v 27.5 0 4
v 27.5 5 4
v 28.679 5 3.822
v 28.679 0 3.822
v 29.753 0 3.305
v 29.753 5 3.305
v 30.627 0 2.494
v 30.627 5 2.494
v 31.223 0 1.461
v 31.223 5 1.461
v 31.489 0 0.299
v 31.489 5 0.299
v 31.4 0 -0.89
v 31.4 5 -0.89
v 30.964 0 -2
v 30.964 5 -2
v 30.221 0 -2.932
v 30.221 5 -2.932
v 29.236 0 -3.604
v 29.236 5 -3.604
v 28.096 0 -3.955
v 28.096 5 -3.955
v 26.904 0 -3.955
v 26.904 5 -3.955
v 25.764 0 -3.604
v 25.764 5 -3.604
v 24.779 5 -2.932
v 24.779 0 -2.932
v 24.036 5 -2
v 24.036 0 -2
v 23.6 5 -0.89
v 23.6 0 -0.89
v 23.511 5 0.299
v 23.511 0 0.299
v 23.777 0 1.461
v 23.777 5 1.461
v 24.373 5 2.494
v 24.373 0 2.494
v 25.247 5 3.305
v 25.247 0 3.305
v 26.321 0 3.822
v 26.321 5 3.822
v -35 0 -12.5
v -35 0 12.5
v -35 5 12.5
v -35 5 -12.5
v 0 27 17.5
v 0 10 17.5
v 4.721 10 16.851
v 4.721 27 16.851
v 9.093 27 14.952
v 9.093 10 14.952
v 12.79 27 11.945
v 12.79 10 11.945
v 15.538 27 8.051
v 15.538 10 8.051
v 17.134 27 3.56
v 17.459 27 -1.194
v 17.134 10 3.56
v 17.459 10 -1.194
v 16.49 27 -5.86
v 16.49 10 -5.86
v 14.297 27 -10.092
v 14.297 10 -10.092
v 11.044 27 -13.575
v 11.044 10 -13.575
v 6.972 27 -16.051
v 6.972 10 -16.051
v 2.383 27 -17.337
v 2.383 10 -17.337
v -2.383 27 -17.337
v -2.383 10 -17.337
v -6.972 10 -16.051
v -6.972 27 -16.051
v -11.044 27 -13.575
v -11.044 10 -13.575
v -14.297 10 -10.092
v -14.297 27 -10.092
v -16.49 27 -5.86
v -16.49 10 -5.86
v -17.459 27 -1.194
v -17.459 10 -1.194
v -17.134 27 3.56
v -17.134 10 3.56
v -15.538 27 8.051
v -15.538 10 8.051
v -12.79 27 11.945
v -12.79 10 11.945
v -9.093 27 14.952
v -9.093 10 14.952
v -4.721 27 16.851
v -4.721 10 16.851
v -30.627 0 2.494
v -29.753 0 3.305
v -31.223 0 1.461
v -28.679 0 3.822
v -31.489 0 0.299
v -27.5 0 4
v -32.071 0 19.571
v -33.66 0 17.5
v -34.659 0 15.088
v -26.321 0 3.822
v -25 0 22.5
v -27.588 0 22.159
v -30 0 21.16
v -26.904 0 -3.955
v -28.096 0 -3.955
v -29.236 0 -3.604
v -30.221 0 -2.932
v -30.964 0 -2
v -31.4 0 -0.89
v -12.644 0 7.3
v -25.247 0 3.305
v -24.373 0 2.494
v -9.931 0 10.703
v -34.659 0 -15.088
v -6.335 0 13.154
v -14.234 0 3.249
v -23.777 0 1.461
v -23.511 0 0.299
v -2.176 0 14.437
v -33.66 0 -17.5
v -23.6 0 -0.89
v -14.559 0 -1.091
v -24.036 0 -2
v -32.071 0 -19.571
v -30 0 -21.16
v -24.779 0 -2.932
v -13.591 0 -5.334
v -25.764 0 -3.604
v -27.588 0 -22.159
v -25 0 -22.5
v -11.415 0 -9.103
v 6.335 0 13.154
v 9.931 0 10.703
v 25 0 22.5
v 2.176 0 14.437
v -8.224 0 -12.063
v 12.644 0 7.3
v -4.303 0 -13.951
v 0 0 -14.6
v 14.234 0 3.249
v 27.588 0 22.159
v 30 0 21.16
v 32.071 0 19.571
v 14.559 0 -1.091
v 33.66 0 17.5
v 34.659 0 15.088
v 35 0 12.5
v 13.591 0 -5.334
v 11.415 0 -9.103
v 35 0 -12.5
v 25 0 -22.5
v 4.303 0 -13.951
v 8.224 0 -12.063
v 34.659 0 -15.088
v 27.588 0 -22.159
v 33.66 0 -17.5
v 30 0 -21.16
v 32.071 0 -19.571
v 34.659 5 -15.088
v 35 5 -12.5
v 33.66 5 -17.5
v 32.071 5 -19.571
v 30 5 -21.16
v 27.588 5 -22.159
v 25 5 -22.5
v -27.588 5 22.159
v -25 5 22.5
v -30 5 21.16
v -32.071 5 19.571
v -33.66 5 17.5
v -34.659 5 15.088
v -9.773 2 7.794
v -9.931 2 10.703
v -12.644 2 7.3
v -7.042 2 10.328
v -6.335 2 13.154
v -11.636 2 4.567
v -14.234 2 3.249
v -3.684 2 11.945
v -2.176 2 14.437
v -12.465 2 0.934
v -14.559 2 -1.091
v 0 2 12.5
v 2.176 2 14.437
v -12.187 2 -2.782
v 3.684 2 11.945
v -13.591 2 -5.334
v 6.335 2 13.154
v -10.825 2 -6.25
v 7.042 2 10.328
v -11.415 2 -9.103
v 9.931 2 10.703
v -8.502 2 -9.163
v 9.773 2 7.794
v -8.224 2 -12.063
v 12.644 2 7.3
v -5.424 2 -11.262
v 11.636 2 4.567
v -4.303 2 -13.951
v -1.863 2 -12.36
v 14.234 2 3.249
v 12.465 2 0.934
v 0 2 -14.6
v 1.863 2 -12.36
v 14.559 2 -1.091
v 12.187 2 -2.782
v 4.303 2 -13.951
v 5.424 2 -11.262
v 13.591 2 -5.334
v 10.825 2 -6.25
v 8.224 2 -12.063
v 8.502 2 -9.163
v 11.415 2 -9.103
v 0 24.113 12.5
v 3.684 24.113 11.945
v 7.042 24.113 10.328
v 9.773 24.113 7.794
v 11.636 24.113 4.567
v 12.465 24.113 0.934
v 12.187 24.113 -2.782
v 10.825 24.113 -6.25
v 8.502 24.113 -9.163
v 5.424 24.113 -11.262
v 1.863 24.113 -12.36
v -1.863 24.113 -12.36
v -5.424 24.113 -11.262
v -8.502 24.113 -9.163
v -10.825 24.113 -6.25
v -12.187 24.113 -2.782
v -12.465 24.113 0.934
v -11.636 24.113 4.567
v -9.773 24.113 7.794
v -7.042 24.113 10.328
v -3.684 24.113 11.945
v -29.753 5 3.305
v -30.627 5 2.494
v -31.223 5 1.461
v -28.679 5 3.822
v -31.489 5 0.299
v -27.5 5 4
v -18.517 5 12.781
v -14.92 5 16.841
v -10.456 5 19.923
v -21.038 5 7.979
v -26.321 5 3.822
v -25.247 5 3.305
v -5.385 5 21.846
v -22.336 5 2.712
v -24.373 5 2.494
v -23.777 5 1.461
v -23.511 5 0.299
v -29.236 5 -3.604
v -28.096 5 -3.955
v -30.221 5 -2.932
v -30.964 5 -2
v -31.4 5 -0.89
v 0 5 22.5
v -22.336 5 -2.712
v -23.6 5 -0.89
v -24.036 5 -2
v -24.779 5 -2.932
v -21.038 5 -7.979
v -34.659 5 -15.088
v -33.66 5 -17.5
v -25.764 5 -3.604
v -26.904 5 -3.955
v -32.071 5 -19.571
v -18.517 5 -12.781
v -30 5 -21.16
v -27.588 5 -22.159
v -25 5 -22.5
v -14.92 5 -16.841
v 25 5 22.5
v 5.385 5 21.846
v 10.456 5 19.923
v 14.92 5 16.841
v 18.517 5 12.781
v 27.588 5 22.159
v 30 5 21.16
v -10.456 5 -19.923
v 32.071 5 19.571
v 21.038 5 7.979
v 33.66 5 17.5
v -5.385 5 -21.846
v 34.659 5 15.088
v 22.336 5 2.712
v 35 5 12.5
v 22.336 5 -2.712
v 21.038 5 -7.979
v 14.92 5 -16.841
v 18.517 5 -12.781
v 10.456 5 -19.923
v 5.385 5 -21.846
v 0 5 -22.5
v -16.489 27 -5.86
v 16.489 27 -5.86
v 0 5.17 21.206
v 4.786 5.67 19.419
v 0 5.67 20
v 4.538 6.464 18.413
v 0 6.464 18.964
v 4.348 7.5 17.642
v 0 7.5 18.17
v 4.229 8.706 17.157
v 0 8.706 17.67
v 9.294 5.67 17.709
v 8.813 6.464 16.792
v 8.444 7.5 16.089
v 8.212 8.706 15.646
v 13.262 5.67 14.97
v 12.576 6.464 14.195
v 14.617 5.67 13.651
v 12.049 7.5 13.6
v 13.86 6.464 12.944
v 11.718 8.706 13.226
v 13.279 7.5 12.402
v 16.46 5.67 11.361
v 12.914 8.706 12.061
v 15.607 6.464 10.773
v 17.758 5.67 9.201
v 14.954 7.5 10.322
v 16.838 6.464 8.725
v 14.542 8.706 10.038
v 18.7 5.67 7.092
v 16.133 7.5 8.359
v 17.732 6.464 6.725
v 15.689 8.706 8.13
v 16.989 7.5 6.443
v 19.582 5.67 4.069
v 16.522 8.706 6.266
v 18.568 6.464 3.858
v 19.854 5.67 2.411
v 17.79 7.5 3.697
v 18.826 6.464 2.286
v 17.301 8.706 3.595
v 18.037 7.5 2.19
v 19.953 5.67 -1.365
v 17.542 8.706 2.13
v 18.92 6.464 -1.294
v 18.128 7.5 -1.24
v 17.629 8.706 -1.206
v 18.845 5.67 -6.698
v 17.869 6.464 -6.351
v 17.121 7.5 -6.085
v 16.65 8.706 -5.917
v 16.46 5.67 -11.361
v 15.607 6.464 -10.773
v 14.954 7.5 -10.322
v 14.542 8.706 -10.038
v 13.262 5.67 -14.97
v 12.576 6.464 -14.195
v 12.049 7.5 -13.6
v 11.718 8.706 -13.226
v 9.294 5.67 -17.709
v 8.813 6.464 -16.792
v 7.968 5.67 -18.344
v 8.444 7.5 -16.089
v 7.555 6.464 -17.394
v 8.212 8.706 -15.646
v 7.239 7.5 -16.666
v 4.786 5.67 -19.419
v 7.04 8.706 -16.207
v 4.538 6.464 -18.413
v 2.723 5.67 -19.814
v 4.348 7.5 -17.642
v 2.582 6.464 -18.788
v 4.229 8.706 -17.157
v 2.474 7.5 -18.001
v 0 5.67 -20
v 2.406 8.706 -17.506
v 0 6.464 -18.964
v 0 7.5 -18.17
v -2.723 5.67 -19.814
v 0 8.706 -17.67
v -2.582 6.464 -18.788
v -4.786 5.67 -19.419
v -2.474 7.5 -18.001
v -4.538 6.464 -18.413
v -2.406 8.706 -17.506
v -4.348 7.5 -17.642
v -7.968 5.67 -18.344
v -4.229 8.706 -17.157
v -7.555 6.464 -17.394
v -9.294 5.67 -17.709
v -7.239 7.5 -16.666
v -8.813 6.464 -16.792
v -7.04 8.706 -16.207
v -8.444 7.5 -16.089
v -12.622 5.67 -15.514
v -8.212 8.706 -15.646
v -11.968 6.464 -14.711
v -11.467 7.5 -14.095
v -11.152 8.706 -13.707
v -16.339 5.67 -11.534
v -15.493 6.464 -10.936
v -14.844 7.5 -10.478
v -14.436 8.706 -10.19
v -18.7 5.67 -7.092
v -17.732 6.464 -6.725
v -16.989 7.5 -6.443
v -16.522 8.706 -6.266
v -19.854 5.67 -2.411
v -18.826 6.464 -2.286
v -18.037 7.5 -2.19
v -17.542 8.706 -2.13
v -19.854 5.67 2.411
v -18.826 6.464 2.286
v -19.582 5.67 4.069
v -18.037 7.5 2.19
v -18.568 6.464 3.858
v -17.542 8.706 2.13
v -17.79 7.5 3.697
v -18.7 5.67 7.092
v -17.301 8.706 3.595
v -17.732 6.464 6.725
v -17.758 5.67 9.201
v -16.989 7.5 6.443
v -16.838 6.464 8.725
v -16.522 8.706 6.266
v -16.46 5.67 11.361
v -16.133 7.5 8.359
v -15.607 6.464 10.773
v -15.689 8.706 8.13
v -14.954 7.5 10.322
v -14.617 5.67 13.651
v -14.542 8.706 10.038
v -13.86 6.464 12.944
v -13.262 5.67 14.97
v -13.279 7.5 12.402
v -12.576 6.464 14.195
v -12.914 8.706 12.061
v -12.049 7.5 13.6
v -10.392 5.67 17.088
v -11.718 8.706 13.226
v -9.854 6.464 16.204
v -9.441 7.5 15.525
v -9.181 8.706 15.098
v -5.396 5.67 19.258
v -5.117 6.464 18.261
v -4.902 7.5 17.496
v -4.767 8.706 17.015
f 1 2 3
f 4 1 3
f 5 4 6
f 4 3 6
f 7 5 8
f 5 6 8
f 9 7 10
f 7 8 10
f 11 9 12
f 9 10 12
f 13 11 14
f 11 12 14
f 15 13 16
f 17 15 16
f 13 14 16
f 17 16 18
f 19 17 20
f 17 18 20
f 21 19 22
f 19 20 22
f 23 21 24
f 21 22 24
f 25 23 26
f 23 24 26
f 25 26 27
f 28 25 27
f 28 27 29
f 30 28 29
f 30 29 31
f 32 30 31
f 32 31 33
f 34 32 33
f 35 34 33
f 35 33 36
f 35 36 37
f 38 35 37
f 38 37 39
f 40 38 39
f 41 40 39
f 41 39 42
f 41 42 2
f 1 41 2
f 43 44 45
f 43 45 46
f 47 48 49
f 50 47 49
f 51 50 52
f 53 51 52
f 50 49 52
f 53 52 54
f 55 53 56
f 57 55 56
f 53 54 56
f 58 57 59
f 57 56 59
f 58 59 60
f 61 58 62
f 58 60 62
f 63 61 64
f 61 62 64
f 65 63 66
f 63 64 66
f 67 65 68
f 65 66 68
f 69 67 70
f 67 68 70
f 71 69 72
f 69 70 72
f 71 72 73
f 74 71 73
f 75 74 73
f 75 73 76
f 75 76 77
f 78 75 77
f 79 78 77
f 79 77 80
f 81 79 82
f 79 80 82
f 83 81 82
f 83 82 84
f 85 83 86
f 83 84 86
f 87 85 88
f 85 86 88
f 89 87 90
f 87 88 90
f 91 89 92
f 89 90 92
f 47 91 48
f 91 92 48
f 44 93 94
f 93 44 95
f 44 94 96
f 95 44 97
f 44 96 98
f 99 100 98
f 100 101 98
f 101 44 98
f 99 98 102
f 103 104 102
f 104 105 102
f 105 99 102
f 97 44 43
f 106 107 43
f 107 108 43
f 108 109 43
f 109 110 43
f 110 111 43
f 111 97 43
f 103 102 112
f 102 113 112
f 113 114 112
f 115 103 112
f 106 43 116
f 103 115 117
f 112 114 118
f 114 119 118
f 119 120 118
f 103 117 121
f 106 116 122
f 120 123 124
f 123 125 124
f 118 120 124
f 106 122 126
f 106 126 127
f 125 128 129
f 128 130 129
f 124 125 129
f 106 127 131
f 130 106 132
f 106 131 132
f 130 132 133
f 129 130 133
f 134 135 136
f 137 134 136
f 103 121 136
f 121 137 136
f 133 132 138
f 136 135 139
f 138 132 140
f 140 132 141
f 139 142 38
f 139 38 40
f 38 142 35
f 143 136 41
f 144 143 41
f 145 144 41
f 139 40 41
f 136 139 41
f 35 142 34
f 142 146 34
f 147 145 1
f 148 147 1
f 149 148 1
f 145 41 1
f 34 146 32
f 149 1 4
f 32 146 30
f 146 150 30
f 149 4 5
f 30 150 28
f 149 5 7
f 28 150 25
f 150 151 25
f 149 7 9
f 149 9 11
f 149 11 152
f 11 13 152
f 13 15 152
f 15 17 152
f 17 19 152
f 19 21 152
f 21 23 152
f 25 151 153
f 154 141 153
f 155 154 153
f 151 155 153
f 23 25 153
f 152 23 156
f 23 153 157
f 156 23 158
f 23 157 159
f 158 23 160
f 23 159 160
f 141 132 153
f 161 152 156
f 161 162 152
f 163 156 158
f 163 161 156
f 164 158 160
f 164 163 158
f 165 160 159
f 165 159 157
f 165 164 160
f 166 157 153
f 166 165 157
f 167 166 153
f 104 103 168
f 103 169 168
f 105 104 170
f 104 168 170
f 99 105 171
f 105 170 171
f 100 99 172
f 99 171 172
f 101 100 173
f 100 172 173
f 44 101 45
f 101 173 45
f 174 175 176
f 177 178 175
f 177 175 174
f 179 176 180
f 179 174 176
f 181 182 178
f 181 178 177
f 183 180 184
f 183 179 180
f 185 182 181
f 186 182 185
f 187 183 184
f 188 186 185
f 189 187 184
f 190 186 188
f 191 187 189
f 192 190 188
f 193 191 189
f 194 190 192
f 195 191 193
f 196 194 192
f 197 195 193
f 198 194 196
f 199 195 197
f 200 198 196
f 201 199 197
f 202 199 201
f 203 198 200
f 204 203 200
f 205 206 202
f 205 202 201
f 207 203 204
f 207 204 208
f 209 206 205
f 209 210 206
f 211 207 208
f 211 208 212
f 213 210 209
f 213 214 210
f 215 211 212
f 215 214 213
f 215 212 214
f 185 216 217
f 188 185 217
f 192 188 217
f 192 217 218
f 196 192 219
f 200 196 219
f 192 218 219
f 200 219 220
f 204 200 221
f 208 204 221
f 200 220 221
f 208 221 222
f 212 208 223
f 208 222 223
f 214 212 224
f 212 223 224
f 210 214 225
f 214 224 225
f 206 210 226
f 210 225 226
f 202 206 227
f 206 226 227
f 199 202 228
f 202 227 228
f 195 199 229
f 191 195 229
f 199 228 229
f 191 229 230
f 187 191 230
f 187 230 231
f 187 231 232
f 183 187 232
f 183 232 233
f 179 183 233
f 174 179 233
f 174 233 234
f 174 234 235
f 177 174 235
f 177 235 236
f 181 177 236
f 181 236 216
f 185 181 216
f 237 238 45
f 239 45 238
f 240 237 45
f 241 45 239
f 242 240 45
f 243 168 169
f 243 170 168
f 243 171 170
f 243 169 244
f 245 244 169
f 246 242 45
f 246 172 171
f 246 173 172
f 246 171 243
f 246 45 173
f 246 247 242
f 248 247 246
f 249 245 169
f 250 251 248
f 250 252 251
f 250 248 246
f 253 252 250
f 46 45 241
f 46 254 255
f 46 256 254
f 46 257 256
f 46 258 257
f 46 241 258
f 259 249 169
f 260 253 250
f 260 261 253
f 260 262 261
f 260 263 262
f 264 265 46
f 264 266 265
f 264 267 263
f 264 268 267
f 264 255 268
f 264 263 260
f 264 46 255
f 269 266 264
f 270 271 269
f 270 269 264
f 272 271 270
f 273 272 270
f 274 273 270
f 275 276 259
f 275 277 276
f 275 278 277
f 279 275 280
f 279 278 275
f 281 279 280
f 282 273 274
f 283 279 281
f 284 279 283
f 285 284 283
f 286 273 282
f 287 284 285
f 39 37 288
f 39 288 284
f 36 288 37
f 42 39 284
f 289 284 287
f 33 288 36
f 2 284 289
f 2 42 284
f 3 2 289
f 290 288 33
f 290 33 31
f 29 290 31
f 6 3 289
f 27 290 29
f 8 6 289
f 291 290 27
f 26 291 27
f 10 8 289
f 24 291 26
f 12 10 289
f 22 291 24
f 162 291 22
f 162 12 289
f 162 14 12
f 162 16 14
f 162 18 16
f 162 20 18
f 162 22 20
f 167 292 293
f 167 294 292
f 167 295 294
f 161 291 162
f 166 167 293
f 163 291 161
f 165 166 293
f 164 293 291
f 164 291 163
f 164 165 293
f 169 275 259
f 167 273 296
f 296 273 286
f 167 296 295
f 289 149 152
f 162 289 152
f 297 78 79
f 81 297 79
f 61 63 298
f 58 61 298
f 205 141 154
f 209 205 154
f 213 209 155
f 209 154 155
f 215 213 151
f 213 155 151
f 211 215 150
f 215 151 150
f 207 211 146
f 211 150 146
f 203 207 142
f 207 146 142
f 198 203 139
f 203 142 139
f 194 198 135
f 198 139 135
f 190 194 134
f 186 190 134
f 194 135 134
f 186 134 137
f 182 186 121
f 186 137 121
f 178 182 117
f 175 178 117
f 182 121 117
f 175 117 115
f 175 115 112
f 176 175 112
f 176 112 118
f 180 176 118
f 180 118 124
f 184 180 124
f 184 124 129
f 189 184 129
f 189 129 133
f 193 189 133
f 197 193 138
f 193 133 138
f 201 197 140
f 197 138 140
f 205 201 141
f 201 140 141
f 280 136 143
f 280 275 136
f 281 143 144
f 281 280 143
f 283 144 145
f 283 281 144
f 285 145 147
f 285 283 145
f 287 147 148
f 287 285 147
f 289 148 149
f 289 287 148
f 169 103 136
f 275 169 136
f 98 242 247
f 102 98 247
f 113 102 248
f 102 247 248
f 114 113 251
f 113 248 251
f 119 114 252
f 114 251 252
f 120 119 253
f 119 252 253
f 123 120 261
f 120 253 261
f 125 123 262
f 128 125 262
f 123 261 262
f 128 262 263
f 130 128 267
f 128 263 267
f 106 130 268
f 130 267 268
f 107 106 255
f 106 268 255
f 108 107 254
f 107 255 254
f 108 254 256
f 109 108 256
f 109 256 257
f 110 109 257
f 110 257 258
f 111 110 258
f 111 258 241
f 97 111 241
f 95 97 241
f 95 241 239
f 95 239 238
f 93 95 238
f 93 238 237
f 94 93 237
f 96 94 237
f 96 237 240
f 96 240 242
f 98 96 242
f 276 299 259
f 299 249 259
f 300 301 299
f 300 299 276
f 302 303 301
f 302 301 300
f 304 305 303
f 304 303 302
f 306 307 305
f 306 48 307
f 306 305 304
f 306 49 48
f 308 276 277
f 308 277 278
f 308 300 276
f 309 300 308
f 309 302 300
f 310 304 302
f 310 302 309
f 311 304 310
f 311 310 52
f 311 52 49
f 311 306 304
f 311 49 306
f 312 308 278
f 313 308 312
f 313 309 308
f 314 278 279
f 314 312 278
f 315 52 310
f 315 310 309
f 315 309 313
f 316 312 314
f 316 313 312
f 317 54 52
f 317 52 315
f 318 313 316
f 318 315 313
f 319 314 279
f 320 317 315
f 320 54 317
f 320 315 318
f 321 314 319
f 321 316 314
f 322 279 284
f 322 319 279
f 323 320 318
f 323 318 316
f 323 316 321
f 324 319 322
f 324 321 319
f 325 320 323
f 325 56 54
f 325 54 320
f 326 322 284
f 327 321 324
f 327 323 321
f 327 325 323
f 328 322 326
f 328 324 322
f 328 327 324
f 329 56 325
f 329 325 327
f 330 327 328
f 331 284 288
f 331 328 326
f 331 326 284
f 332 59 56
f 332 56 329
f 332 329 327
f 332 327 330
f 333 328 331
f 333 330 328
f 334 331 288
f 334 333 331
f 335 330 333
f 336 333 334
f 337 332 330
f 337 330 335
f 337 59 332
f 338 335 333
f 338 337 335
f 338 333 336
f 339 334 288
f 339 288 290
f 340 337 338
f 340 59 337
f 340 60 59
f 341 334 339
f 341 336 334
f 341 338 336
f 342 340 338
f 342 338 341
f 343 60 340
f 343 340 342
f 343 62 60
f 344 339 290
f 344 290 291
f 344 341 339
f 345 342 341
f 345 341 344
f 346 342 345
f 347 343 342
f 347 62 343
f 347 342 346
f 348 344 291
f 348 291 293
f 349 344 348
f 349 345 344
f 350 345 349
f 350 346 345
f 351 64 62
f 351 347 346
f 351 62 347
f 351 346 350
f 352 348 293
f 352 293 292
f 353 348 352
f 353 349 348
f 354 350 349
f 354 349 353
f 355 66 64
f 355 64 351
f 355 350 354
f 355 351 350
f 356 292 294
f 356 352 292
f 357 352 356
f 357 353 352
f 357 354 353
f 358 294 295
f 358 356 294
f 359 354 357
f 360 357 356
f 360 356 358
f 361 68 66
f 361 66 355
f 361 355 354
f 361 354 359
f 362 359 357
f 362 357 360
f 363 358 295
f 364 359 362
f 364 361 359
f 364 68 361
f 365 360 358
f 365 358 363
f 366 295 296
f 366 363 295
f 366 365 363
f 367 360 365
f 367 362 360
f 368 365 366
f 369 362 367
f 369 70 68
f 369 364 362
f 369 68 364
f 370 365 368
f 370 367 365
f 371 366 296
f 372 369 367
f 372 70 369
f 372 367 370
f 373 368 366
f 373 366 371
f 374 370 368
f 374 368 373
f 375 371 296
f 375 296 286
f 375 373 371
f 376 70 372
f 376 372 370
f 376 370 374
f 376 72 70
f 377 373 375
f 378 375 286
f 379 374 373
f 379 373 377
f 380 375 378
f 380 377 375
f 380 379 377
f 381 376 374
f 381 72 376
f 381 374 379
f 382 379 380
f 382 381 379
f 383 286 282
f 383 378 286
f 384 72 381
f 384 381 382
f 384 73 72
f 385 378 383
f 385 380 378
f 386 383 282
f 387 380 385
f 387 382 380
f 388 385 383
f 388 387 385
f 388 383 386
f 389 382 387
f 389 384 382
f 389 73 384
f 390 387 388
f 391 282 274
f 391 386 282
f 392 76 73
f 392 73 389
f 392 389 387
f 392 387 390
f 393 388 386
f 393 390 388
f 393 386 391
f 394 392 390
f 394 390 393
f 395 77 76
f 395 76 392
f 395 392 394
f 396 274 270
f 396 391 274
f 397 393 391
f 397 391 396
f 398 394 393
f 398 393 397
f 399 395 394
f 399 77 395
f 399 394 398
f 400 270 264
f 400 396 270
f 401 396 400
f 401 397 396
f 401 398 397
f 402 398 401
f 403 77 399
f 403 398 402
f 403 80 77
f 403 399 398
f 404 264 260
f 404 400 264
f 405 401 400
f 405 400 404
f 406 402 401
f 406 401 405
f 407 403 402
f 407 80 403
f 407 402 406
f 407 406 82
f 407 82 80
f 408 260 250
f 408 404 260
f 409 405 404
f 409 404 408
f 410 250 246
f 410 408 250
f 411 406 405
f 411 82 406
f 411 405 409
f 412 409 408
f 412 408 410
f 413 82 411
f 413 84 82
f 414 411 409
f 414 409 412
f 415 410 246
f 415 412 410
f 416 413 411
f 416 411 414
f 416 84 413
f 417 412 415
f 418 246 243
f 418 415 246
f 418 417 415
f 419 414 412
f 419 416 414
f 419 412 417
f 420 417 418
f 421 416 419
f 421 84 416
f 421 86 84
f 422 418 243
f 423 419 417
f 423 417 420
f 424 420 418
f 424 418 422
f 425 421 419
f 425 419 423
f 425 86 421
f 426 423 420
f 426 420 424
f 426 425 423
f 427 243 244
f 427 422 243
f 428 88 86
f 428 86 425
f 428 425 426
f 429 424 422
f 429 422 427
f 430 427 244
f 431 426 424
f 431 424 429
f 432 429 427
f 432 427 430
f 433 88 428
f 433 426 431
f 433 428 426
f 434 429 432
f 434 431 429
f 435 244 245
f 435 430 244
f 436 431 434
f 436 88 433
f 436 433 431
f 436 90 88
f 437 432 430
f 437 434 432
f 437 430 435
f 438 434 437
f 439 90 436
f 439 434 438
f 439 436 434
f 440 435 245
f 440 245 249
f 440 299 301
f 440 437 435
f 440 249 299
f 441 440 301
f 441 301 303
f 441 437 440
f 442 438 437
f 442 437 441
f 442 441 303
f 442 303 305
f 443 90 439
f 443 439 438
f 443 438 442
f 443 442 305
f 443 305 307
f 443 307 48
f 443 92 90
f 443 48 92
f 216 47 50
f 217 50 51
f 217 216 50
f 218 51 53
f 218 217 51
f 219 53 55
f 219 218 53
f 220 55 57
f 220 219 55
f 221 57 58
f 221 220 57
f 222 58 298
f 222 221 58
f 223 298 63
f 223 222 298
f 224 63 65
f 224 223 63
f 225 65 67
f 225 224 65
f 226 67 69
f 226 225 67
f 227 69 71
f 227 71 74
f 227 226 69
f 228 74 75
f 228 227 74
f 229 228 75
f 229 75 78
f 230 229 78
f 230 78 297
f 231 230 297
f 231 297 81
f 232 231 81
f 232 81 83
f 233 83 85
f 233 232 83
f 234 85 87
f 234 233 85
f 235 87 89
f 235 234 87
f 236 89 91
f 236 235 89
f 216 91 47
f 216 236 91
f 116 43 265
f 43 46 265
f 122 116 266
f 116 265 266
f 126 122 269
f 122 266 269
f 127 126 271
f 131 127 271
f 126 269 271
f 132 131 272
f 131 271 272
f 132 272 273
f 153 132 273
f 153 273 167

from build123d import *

# Parameters (mm, degrees)
CROQUIS1_W              = 70
CROQUIS1_H              = 45
SALIENTE_EXTRUIR1_DEPTH = 5
REDONDEO1_R             = 10
REDONDEO2_R             = 10
CROQUIS2_R              = 17.5
SALIENTE_EXTRUIR2_DEPTH = 22
REDONDEO3_R             = 5
CROQUIS3_R              = 12.5
CORTAR_EXTRUIR1_DEPTH   = 50.60090725
CHAFL_N1_SIZE2          = 2.886751346
CHAFL_N1_SIZE           = 5
CROQUIS4_R              = 14.6
CORTAR_EXTRUIR2_DEPTH   = 2
CROQUIS5_R              = 4
CORTAR_EXTRUIR3_DEPTH   = 48.066442398


with BuildPart() as part:
    # Croquis1 → Saliente-Extruir1 (new body)
    with BuildSketch(Plane(origin=(0, 0, 0), x_dir=(1, 0, 0), z_dir=(0, 1, 0))):
        Rectangle(CROQUIS1_W, CROQUIS1_H)
    extrude(amount=SALIENTE_EXTRUIR1_DEPTH)

    # Redondeo1
    redondeo1_edges = [part.edges().sort_by_distance(p)[0] for p in [
        (35, 2.5, 22.5),
    ]]
    fillet(redondeo1_edges, radius=REDONDEO1_R)

    # Redondeo2
    redondeo2_edges = [part.edges().sort_by_distance(p)[0] for p in [
        (-35, 2.5, 22.5),
        (-35, 2.5, -22.5),
        (35, 2.5, -22.5),
    ]]
    fillet(redondeo2_edges, radius=REDONDEO2_R)

    # Croquis2 → Saliente-Extruir2 (add)
    with BuildSketch(Plane(origin=(0, 5, 0), x_dir=(1, 0, 0), z_dir=(0, 1, 0))):
        with Locations(Location((0, 0, 0), (0, 0, 270))):
            Circle(CROQUIS2_R)
    extrude(amount=SALIENTE_EXTRUIR2_DEPTH)

    # Redondeo3
    redondeo3_edges = [part.edges().sort_by_distance(p)[0] for p in [
        (0, 5, -17.5),
    ]]
    fillet(redondeo3_edges, radius=REDONDEO3_R - 0.0001)  # a hair under: the kernel refuses the full size

    # Croquis3 → Cortar-Extruir1 (cut, through all)
    with BuildSketch(Plane(origin=(0, 27, 0), x_dir=(1, 0, 0), z_dir=(0, 1, 0))):
        with Locations(Location((0, 0, 0), (0, 0, 270))):
            Circle(CROQUIS3_R)
    extrude(amount=-CORTAR_EXTRUIR1_DEPTH, mode=Mode.SUBTRACT)

    # Chaflán1
    chafl_n1_edges = [part.edges().sort_by_distance(p)[0] for p in [
        (0, 27, -12.5),
    ]]
    chafl_n1_side = [part.faces().sort_by_distance(p)[0] for p in [
        (0, 27, -12.557735027),
    ]]
    chamfer(chafl_n1_edges, length=CHAFL_N1_SIZE - 0.0001, length2=CHAFL_N1_SIZE2 - 0.0001, reference=chafl_n1_side[0])  # a hair under: the kernel refuses the full size

    # Croquis4 → Cortar-Extruir2 (cut)
    with BuildSketch(Plane(origin=(0, 0, 0), x_dir=(-1, 0, 0), z_dir=(0, -1, 0))):
        with Locations(Location((0, 0, 0), (0, 0, 90))):
            Circle(CROQUIS4_R)
    extrude(amount=-CORTAR_EXTRUIR2_DEPTH, mode=Mode.SUBTRACT)

    # Croquis5 → Cortar-Extruir3 (cut, through all)
    with BuildSketch(Plane(origin=(0, 5, 0), x_dir=(1, 0, 0), z_dir=(0, 1, 0))):
        with Locations(Location((-27.5, 0, 0), (0, 0, 270))):
            Circle(CROQUIS5_R)
        with Locations(Location((27.5, 0, 0), (0, 0, 270))):
            Circle(CROQUIS5_R)
    extrude(amount=-CORTAR_EXTRUIR3_DEPTH, mode=Mode.SUBTRACT)


solid = part.part
